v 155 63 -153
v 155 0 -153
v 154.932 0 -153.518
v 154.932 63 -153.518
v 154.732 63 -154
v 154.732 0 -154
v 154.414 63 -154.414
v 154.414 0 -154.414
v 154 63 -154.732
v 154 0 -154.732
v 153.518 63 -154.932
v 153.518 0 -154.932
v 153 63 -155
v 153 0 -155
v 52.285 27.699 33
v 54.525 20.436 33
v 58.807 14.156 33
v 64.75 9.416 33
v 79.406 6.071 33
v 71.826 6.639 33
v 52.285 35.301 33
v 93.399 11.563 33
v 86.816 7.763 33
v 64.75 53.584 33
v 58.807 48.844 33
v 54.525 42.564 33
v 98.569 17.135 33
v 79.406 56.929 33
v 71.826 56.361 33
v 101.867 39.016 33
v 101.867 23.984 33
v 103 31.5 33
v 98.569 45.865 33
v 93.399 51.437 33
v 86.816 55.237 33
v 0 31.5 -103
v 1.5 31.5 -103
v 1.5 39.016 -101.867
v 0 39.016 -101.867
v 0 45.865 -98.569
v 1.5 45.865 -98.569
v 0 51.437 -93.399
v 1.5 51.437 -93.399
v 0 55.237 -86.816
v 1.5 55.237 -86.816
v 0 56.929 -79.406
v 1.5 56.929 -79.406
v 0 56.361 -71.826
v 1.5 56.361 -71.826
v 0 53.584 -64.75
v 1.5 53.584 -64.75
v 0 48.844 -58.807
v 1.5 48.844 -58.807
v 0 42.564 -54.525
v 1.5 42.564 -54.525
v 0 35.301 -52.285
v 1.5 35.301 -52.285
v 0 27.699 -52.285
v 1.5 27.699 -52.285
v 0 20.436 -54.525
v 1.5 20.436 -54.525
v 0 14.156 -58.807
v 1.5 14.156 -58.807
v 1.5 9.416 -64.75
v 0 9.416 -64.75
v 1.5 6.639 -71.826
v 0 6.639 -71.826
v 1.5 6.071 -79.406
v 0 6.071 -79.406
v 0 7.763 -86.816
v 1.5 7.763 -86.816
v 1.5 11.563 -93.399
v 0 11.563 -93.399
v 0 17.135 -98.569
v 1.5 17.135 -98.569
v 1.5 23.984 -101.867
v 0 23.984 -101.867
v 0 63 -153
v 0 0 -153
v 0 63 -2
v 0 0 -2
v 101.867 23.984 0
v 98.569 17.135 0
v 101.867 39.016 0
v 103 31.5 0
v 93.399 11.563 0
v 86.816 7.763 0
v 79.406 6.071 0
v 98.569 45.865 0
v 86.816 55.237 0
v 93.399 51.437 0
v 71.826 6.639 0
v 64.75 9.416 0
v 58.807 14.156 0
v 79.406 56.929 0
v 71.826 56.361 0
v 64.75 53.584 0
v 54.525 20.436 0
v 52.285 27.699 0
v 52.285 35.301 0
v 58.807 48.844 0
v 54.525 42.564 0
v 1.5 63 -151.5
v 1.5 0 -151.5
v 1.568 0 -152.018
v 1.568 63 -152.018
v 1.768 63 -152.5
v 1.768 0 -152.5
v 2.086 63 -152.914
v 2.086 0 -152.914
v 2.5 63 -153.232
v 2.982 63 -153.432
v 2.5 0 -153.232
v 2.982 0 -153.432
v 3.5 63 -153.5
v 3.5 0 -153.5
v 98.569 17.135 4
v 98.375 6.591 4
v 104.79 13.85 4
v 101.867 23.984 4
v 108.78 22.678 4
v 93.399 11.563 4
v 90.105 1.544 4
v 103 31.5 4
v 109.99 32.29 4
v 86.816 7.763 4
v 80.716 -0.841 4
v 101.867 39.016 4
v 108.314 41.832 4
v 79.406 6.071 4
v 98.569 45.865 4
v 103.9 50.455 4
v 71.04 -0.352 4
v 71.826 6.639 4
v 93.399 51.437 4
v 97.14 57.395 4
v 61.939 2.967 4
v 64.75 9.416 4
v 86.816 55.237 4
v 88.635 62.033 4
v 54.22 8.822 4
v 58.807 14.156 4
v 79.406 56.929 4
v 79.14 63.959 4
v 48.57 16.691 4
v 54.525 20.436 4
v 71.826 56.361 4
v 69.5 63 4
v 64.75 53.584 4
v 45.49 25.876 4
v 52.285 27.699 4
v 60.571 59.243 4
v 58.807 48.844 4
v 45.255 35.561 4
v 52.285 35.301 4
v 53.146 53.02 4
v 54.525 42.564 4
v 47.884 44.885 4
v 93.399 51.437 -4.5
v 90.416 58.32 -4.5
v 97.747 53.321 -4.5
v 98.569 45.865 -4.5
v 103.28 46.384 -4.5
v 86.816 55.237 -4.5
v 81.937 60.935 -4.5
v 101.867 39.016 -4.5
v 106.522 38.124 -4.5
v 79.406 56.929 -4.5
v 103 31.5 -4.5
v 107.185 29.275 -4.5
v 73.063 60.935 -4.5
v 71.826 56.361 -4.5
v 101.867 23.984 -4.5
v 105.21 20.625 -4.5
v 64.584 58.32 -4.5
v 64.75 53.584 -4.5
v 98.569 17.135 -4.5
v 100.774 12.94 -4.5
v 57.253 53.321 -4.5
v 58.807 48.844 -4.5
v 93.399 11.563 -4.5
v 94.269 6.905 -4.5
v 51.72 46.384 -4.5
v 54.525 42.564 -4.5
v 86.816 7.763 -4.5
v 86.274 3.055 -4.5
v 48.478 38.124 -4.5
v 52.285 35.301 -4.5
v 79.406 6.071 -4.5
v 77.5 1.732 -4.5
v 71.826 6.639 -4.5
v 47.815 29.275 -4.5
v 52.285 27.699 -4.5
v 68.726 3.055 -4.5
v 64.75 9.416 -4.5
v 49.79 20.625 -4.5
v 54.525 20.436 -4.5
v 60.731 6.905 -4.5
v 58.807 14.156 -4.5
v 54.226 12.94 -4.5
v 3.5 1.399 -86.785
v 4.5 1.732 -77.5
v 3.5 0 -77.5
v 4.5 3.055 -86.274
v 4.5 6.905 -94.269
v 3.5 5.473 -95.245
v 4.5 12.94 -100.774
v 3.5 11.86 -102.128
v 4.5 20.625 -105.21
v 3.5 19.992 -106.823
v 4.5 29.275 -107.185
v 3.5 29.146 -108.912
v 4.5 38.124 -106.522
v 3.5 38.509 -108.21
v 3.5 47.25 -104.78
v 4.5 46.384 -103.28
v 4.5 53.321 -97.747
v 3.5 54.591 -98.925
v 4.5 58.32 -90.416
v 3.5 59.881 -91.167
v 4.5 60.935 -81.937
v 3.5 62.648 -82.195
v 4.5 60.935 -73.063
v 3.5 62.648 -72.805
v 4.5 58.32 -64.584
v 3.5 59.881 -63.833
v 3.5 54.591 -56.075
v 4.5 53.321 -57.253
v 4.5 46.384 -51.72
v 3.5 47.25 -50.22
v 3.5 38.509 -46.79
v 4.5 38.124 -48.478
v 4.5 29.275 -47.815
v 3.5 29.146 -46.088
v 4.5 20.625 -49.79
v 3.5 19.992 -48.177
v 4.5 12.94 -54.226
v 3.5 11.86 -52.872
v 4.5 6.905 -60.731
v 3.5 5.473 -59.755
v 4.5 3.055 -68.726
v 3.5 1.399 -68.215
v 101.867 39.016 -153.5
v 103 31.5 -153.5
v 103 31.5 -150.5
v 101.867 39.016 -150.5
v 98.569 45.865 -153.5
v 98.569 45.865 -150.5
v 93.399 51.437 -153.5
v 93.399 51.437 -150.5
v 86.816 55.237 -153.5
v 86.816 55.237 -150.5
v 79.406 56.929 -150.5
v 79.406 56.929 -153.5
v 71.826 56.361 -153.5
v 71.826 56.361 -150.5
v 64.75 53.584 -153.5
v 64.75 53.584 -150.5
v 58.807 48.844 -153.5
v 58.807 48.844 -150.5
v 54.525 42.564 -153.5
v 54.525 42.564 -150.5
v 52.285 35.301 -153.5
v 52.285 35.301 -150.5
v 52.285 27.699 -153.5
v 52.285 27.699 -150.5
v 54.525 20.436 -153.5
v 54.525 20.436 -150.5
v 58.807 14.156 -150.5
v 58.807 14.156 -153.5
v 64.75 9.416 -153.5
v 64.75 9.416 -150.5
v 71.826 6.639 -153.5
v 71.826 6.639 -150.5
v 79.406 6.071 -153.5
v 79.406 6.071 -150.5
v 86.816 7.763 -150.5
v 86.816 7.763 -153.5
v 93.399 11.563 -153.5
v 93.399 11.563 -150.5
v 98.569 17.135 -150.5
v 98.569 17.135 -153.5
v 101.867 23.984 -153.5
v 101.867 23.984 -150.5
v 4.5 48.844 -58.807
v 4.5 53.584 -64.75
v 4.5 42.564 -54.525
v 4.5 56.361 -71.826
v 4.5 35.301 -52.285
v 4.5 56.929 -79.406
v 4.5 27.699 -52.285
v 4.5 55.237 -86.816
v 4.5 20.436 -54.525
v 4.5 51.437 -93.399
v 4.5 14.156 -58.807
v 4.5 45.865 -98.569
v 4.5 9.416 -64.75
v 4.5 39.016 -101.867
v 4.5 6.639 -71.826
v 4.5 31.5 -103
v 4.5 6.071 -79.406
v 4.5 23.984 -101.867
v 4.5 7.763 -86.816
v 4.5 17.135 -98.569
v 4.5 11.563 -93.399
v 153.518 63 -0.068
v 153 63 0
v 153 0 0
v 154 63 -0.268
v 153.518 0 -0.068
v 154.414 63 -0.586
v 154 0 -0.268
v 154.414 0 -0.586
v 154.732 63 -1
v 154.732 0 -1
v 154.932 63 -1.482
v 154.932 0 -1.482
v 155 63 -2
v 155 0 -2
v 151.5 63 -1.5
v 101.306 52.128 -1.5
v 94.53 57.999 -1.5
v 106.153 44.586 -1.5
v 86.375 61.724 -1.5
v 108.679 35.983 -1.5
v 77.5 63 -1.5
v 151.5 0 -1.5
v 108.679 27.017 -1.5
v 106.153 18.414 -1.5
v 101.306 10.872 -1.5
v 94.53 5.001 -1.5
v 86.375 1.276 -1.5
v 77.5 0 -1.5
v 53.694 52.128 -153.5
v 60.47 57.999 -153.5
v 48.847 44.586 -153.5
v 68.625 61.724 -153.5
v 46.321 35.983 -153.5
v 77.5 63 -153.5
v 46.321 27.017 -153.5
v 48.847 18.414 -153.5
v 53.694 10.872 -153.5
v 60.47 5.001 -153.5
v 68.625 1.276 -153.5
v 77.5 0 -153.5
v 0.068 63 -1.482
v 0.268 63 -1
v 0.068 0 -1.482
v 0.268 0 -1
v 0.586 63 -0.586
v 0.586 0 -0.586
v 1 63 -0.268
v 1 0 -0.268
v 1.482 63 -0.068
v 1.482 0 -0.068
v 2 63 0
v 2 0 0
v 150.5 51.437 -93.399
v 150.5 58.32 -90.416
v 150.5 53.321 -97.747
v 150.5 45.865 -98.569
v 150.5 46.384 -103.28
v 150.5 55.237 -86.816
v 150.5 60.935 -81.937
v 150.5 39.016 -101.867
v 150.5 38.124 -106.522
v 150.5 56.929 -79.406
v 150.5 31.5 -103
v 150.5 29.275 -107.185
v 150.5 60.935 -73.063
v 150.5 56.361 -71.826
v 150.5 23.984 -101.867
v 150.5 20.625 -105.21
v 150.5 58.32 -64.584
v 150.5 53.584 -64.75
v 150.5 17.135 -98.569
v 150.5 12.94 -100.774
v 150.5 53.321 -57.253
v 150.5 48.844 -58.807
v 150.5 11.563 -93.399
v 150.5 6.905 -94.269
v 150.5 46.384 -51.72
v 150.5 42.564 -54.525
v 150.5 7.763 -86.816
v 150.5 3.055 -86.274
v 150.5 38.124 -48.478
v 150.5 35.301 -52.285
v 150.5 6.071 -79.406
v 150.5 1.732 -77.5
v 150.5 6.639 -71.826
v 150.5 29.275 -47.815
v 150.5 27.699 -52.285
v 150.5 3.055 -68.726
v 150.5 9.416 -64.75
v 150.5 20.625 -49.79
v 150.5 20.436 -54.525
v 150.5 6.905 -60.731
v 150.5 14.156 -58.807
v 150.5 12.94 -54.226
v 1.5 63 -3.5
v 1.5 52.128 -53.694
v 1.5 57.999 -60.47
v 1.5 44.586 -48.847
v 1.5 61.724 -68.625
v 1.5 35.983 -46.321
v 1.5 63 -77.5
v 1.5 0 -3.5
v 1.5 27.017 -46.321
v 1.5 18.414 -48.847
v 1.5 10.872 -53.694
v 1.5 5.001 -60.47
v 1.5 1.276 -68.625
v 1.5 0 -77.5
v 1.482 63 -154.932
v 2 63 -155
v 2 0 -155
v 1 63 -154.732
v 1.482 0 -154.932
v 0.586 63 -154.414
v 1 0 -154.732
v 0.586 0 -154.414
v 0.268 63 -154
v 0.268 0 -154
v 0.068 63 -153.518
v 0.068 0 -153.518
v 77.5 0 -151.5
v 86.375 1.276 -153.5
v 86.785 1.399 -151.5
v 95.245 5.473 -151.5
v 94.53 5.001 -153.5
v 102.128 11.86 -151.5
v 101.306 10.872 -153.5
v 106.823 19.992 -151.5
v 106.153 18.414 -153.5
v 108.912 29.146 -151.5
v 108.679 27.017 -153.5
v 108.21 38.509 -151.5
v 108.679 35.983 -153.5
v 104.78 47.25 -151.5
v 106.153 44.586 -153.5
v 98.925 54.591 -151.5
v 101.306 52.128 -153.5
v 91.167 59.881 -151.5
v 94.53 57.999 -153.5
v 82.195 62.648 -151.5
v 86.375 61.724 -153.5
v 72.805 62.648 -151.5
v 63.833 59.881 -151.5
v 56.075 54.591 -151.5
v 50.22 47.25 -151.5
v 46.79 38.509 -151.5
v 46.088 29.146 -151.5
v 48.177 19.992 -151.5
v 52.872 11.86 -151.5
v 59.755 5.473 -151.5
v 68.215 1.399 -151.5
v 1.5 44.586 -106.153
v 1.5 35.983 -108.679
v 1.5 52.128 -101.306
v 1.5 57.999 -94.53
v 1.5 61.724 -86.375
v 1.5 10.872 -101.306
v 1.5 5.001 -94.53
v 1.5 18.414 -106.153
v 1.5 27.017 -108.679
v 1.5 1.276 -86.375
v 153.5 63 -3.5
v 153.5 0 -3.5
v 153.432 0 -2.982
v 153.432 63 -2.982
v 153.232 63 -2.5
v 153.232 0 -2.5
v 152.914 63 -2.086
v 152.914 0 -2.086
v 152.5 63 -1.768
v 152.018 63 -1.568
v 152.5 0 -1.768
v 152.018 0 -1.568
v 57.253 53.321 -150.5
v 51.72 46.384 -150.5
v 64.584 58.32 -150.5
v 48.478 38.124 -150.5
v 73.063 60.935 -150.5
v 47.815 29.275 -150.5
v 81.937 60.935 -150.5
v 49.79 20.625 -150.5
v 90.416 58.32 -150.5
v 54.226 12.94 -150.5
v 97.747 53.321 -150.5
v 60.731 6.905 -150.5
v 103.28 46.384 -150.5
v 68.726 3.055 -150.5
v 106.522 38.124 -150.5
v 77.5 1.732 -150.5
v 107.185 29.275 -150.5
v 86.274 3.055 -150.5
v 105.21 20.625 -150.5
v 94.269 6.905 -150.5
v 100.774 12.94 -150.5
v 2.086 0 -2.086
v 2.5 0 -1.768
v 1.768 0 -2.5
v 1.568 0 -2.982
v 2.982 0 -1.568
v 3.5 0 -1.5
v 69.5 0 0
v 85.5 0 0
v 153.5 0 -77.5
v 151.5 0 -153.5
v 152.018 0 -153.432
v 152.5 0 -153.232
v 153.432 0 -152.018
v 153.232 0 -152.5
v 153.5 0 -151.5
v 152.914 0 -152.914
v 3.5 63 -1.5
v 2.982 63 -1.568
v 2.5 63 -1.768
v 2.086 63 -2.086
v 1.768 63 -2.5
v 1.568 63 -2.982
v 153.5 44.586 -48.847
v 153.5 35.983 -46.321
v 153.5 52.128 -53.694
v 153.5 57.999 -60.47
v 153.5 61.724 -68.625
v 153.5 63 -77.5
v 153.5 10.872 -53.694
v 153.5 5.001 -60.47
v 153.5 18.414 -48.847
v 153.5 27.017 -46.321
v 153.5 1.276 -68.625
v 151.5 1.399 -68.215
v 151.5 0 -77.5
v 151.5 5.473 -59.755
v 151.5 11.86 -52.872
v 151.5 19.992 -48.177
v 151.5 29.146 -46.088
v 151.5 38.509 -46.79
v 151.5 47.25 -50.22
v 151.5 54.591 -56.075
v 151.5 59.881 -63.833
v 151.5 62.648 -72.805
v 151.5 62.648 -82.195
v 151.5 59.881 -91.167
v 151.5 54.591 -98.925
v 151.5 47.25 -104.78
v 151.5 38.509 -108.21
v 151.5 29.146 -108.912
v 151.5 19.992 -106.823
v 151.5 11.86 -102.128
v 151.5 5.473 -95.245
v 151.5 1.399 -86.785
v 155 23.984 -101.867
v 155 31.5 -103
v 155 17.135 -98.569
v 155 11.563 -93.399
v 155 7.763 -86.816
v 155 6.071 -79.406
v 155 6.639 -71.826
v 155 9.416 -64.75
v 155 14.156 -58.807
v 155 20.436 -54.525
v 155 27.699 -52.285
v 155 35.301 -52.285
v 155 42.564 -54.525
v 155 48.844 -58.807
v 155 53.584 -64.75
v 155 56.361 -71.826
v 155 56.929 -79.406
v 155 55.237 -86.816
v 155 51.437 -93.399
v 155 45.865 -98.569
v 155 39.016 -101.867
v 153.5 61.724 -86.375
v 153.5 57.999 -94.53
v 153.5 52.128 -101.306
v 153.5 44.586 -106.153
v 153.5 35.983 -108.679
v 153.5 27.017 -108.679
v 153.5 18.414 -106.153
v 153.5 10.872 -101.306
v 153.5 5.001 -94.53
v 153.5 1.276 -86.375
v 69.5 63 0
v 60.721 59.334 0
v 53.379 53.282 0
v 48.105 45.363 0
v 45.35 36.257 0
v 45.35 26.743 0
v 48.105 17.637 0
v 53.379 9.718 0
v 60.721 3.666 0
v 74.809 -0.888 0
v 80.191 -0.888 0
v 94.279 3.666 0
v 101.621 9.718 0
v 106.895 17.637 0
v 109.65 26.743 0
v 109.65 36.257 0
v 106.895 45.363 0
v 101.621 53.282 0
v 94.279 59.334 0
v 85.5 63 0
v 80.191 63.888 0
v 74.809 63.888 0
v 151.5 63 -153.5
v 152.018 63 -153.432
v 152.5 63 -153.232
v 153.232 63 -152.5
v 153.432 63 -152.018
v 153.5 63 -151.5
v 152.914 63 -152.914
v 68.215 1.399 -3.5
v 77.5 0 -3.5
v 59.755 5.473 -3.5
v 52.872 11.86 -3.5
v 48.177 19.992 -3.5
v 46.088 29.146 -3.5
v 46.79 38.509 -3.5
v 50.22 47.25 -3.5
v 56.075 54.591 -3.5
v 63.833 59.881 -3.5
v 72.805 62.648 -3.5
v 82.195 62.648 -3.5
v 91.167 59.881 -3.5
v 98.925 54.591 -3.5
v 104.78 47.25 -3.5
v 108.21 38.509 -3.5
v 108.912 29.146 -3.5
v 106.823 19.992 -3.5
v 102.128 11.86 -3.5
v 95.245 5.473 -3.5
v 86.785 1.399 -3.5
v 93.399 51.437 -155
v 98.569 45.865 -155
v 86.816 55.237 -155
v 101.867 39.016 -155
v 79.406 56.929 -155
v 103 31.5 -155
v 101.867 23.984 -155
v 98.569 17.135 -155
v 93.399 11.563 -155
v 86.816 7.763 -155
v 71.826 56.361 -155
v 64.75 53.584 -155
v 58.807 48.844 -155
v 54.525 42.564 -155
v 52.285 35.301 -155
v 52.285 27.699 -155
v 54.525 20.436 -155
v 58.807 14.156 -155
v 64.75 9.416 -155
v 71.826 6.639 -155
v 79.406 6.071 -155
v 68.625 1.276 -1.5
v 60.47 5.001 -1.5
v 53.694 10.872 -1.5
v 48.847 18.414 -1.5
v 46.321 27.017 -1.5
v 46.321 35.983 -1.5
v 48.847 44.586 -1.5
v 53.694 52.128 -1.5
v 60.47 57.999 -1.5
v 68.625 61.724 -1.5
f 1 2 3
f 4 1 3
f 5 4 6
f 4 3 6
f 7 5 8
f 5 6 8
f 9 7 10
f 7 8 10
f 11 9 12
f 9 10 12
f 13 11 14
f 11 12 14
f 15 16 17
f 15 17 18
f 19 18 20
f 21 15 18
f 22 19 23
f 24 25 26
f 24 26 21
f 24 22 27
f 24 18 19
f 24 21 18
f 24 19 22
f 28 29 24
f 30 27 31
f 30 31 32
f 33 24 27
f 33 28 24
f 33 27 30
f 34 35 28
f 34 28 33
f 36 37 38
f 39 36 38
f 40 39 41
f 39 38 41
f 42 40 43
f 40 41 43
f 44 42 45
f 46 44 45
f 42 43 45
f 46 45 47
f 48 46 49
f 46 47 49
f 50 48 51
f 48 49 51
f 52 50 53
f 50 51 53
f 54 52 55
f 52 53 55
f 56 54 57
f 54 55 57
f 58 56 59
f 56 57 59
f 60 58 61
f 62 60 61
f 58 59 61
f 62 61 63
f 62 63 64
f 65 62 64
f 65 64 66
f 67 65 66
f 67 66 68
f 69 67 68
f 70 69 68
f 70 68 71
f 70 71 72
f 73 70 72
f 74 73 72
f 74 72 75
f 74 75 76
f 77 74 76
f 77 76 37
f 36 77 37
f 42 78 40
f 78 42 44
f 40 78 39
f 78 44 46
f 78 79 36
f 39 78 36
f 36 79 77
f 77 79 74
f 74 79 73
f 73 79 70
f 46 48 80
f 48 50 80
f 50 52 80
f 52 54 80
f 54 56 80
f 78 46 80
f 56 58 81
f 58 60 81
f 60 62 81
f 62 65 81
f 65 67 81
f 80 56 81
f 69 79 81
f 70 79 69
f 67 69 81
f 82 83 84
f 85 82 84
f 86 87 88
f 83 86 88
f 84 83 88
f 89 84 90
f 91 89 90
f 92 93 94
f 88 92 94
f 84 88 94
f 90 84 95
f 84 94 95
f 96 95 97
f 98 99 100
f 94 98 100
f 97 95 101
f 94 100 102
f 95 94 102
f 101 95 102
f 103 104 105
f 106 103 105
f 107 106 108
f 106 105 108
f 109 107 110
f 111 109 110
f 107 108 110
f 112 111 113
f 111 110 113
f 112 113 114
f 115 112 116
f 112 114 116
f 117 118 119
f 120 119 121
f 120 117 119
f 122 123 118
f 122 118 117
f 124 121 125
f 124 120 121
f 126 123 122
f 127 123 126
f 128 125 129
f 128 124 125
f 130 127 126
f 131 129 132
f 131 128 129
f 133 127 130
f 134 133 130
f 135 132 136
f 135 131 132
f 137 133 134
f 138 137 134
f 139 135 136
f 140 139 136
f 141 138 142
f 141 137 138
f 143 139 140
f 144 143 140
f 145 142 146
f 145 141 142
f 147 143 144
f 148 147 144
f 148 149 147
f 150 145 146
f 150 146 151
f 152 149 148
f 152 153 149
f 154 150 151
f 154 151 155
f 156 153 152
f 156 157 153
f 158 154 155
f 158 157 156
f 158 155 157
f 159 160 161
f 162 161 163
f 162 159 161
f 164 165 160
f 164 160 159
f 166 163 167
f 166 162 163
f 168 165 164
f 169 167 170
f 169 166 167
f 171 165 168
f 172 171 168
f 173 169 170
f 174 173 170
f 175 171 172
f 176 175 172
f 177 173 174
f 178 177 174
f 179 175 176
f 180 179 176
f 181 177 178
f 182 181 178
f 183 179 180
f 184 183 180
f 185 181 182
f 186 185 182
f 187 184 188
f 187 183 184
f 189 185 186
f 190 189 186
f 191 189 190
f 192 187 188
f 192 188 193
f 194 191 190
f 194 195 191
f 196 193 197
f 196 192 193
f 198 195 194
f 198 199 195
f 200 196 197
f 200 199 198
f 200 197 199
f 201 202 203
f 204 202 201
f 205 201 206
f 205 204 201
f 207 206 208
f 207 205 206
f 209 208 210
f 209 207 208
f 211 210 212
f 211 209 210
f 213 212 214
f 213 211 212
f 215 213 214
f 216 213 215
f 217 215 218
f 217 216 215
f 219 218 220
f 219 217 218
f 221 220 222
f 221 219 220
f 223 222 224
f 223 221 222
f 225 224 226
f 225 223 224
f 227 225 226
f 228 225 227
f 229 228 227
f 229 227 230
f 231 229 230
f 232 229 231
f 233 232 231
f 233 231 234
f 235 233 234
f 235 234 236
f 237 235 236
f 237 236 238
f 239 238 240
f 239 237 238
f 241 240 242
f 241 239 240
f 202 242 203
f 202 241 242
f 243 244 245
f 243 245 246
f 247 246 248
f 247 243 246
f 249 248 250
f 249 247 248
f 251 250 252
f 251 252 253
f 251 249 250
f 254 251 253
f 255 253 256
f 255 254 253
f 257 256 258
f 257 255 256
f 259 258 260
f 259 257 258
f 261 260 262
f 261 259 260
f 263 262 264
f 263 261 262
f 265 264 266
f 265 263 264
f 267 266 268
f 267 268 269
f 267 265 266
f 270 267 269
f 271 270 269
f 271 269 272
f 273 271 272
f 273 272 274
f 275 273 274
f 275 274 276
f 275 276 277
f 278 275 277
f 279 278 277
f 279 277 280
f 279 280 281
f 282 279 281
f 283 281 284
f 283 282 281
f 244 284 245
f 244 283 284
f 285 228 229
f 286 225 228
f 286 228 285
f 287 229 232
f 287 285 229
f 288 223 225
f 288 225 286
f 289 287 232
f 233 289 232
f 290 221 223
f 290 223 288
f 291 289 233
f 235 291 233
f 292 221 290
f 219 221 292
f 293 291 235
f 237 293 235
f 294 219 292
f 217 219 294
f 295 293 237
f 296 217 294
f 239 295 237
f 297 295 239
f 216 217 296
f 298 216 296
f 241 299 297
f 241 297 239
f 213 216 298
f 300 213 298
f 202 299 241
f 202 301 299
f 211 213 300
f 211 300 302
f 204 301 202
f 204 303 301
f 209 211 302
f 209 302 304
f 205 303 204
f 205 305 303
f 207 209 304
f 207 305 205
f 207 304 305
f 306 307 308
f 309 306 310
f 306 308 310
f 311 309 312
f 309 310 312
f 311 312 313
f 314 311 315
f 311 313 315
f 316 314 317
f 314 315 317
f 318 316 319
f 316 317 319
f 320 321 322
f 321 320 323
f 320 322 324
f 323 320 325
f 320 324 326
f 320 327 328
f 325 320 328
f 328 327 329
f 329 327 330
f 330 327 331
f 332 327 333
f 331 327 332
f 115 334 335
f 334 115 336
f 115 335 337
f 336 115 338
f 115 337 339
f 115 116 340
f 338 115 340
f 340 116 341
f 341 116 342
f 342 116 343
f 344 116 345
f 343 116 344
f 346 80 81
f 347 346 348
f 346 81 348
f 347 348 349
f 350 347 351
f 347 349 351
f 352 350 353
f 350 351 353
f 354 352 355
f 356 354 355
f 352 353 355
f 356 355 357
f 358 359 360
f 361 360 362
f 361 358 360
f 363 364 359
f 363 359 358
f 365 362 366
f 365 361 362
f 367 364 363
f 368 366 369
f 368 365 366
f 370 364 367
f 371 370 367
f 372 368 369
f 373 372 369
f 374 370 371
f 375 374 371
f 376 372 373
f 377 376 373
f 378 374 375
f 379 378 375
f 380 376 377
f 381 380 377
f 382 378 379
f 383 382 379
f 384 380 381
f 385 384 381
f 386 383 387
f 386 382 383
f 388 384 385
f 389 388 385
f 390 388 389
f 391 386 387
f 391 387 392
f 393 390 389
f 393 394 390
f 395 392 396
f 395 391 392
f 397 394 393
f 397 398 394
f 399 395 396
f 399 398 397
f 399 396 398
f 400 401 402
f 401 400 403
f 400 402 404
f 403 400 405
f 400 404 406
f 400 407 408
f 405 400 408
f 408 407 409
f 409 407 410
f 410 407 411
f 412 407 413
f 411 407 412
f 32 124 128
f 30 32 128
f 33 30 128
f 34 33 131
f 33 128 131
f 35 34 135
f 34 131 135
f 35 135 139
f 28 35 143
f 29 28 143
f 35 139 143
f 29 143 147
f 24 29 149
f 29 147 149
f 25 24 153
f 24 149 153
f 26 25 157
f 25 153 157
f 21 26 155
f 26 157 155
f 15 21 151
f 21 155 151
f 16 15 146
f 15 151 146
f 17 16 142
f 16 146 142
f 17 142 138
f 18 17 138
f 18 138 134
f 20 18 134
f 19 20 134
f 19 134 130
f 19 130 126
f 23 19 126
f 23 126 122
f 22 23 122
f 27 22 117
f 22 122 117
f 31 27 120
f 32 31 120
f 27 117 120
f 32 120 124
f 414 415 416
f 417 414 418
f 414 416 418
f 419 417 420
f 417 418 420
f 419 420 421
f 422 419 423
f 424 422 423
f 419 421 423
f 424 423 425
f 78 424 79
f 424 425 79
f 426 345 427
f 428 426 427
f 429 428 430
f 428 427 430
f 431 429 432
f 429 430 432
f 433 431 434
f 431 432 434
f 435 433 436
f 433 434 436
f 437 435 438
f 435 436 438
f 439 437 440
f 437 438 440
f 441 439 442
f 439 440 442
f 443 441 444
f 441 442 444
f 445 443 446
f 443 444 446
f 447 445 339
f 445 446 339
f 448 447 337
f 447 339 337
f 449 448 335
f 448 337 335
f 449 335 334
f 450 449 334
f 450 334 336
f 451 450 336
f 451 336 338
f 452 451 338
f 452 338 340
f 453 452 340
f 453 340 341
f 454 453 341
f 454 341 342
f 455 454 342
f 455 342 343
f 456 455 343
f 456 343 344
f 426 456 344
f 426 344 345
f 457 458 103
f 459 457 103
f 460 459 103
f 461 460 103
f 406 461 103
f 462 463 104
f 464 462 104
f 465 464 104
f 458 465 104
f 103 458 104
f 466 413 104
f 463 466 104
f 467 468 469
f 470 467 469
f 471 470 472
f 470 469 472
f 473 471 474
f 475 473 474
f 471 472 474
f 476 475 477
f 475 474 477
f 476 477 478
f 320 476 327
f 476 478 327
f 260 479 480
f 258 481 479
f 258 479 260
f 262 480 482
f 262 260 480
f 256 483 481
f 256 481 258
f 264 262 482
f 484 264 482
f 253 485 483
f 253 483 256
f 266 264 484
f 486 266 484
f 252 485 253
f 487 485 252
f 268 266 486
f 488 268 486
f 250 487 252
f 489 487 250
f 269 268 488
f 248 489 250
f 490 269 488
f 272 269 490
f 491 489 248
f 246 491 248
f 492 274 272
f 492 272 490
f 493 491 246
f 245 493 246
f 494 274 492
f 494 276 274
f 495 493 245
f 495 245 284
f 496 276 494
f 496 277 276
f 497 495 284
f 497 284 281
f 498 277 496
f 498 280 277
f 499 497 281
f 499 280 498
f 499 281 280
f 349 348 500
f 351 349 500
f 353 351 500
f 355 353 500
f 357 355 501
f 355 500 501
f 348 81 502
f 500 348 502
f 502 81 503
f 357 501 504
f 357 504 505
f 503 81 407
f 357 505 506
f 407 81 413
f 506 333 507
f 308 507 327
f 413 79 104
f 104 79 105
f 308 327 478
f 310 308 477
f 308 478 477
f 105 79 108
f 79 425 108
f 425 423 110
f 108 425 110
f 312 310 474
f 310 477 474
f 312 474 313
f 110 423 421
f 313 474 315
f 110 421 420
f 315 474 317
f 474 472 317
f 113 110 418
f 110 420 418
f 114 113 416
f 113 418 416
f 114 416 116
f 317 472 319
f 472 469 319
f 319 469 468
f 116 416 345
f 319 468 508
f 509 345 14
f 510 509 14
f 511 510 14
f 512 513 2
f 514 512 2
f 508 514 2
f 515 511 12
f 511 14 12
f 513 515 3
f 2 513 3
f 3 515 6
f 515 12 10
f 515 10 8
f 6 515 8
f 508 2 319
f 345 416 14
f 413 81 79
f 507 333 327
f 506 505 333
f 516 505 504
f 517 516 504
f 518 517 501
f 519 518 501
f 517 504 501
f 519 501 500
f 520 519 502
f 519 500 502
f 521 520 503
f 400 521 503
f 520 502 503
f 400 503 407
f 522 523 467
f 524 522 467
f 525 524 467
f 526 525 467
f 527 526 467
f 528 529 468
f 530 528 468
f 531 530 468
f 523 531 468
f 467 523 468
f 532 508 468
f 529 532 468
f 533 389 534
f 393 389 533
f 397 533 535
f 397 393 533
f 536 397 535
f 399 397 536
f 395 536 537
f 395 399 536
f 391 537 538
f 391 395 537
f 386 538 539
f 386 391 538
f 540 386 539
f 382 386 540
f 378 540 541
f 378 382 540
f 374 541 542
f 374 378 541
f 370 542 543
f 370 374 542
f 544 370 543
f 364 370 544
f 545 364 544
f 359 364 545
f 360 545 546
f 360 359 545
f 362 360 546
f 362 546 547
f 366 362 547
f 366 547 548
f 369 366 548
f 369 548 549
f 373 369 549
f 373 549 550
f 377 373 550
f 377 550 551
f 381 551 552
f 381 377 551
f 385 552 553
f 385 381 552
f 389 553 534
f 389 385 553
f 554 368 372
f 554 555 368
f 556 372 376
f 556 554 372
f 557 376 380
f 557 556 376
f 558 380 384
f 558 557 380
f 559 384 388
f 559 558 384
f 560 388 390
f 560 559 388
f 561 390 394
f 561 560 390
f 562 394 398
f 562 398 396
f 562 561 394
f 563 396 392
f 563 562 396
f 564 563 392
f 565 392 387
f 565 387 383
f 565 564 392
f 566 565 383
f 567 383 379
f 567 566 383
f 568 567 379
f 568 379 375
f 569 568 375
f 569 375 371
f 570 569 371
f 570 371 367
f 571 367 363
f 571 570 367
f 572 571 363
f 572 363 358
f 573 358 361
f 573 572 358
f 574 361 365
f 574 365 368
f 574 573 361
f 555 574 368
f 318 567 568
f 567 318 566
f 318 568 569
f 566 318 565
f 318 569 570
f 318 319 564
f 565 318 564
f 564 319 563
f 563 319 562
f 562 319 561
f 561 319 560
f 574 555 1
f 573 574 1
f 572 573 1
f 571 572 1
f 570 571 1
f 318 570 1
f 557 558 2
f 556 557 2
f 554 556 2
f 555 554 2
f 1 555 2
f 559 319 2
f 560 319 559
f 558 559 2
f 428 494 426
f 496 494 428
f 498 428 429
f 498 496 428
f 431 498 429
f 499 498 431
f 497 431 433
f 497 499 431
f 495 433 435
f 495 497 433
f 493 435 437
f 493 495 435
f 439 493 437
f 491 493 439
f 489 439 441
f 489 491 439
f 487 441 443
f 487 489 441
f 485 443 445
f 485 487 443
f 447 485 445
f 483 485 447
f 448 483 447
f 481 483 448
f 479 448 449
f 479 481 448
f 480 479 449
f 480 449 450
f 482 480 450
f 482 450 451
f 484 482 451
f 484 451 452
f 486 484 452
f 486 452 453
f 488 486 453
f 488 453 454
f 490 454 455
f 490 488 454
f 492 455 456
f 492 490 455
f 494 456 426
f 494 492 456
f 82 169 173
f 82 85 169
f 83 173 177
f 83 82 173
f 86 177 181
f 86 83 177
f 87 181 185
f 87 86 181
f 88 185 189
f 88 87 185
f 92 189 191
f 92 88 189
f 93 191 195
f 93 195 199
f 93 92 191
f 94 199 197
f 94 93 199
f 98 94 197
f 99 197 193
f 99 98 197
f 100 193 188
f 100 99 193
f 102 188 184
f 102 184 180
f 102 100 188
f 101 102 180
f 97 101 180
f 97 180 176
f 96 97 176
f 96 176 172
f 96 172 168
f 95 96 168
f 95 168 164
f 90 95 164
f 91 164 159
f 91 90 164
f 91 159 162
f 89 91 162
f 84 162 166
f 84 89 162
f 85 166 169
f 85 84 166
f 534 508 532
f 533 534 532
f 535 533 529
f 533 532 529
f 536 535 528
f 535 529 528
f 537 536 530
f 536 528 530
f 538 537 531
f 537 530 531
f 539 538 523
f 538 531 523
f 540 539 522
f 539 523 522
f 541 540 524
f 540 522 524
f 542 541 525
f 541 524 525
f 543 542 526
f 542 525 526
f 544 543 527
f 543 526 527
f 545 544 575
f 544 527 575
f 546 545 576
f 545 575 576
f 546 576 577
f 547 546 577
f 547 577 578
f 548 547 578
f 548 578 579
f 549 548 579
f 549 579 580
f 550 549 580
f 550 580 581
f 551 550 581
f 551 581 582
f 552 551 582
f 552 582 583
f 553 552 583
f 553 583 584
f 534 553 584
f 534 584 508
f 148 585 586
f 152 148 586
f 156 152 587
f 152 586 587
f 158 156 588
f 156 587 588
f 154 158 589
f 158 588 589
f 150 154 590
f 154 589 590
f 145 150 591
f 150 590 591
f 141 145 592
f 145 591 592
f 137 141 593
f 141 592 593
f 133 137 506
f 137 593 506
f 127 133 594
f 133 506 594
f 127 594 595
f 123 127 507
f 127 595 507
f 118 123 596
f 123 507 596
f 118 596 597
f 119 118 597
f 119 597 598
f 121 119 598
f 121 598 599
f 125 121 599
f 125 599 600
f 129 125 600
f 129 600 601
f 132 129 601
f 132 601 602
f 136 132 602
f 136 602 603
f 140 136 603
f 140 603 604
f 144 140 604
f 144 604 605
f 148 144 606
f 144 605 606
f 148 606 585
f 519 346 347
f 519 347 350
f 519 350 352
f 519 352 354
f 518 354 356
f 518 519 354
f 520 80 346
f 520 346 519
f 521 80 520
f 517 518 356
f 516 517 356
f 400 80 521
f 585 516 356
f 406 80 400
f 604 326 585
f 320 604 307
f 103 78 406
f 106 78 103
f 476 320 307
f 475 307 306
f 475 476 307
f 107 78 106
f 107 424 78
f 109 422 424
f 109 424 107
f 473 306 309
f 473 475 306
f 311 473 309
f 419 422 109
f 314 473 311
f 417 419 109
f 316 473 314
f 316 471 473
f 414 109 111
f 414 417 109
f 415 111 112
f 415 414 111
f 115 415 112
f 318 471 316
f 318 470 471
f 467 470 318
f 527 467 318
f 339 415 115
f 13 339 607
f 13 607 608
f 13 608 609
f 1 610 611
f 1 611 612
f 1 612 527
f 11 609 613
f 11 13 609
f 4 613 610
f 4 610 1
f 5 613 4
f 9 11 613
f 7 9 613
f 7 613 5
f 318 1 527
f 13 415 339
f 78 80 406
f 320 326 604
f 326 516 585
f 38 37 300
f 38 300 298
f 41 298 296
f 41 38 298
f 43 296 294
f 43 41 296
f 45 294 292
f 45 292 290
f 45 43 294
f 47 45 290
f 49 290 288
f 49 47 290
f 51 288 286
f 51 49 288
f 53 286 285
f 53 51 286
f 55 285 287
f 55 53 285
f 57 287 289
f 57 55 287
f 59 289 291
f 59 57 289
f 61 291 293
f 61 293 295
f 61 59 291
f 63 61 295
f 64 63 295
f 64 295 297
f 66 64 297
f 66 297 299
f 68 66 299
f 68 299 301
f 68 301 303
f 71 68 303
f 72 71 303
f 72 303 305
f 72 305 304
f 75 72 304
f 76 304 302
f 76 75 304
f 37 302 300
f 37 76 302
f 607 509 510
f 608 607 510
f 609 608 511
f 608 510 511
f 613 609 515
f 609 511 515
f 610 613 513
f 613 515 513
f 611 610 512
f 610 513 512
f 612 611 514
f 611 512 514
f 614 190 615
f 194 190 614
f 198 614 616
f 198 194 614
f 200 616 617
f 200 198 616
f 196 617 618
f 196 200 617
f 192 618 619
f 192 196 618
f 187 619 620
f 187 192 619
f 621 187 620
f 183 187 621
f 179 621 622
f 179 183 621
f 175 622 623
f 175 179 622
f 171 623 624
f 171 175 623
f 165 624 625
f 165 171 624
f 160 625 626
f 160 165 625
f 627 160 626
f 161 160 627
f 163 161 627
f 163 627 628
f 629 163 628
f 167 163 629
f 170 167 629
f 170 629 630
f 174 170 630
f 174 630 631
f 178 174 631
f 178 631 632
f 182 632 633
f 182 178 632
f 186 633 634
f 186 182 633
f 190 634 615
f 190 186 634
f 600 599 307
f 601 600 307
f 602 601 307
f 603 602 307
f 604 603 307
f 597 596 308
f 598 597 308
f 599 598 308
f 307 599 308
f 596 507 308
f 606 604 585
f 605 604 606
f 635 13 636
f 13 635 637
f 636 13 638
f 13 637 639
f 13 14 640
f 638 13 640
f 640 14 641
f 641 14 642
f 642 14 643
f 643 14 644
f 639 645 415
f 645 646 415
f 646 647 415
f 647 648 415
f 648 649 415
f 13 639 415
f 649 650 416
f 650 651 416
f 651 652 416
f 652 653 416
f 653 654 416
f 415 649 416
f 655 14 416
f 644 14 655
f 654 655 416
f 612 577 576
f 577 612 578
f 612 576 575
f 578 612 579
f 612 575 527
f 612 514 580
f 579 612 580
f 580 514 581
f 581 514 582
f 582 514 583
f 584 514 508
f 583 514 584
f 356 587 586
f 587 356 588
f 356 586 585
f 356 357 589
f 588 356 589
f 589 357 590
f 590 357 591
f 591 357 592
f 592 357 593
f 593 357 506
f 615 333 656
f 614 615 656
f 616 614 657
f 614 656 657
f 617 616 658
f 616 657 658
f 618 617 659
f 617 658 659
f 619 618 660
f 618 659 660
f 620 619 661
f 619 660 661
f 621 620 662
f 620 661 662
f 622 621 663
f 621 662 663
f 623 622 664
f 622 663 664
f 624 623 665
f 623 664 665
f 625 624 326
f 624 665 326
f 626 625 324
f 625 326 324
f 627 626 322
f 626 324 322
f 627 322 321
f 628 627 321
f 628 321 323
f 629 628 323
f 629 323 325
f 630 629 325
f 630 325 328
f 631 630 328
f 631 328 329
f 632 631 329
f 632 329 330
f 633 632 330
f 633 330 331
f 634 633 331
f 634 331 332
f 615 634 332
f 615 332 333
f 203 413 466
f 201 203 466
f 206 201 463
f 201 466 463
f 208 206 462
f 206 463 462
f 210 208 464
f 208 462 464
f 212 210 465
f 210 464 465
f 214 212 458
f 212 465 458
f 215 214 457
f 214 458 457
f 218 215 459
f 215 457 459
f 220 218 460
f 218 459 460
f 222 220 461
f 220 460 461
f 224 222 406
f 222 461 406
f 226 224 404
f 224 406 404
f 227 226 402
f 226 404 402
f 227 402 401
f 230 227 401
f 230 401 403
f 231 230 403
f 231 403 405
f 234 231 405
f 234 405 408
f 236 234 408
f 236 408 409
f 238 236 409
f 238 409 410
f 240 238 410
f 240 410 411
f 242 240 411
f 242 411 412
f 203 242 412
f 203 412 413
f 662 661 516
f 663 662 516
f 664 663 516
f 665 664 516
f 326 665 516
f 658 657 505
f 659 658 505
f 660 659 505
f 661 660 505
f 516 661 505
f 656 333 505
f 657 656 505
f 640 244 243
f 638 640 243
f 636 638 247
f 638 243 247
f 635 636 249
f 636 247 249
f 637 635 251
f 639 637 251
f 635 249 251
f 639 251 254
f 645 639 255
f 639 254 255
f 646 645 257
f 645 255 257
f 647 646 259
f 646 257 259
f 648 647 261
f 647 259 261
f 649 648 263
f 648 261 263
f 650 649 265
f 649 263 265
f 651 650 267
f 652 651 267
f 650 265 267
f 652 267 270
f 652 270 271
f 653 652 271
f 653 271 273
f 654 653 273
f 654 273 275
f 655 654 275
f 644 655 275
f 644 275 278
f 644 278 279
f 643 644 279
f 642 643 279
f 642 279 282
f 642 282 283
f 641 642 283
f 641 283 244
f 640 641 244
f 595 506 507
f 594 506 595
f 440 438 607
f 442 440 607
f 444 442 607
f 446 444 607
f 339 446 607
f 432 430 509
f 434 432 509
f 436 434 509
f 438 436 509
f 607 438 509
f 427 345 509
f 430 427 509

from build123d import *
from OCP.BRepFilletAPI import BRepFilletAPI_MakeChamfer

# Parameters (mm, degrees)
EXTRUDE_1_DEPTH     = 63
CUT_EXTRUDE_1_REACH = 230.077
SKETCH_2_R          = 25.5
CUT_EXTRUDE_2_REACH = 230.077
SKETCH_3_R          = 25.5
SKETCH_4_R          = 31.5
SKETCH_4_R_2        = 25.5
EXTRUDE_1_2_DEPTH   = 3
CHAMFER_1_SIZE      = 1
CHAMFER_1_SIZE2     = 1.732050808
SKETCH_5_R          = 31.5
SKETCH_5_R_2        = 25.5
EXTRUDE_4_DEPTH     = 3
CHAMFER_2_SIZE      = 1
CHAMFER_2_SIZE2     = 1.732050808
SKETCH_7_R          = 31.5
SKETCH_7_R_2        = 25.5
EXTRUDE_5_DEPTH     = 3
SKETCH_8_R          = 31.5
SKETCH_8_R_2        = 25.5
EXTRUDE_6_DEPTH     = 3
CHAMFER_3_SIZE      = 1
CHAMFER_3_SIZE2     = 1.732050808
SKETCH_9_R          = 32.5
EXTRUDE_7_DEPTH     = 4
SKETCH_10_R         = 25.5
EXTRUDE_8_DEPTH     = 29


with BuildPart() as part:
    # Эскиз1 → Extrude 1 (new body)
    with BuildSketch(Plane(origin=(0, 0, 0), x_dir=(1, 0, 0), z_dir=(0, 1, 0))):
        with BuildLine():
            Line((2, 0), (153, 0))
            ThreePointArc((153, 0), (154.414213562, 0.585786438), (155, 2))
            Line((155, 2), (155, 153))
            ThreePointArc((155, 153), (154.414213562, 154.414213562), (153, 155))
            Line((153, 155), (2, 155))
            ThreePointArc((2, 155), (0.585786438, 154.414213562), (0, 153))
            Line((0, 153), (0, 2))
            ThreePointArc((0, 2), (0.585786438, 0.585786438), (2, 0))
        make_face()
        with BuildLine():
            Line((3.5, 153.5), (151.5, 153.5))
            ThreePointArc((151.5, 153.5), (152.914213562, 152.914213562), (153.5, 151.5))
            Line((153.5, 151.5), (153.5, 3.5))
            ThreePointArc((153.5, 3.5), (152.914213562, 2.085786438), (151.5, 1.5))
            Line((151.5, 1.5), (3.5, 1.5))
            ThreePointArc((3.5, 1.5), (2.085786438, 2.085786438), (1.5, 3.5))
            Line((1.5, 3.5), (1.5, 151.5))
            ThreePointArc((1.5, 151.5), (2.085786438, 152.914213562), (3.5, 153.5))
        make_face(mode=Mode.SUBTRACT)
    extrude(amount=EXTRUDE_1_DEPTH)

    # Вырез-Вытянуть1: up to this face of the body (flat: up to its plane)
    cut_extrude_1_end = Plane(part.part.faces().sort_by_distance((77.5, 31.5, -155))[0])
    # Эскиз2 → Вырез-Вытянуть1 (cut, up to the picked face)
    with BuildSketch(Plane.XY, mode=Mode.PRIVATE) as cut_extrude_1_sk1:
        with Locations((77.5, 31.5)):
            Circle(SKETCH_2_R)
    cut_extrude_1_tool1 = split(extrude(cut_extrude_1_sk1.sketch, amount=-CUT_EXTRUDE_1_REACH, mode=Mode.PRIVATE), bisect_by=cut_extrude_1_end, keep=Keep.BOTH, mode=Mode.PRIVATE)
    add(cut_extrude_1_tool1.solids().sort_by(Axis((77.5, 31.5, 0), (0, 0, -1)))[0], mode=Mode.SUBTRACT)

    # Вырез-Вытянуть2: up to this face of the body (flat: up to its plane)
    cut_extrude_2_end = Plane(part.part.faces().sort_by_distance((0, 31.5, -77.5))[0])
    # Эскиз3 → Вырез-Вытянуть2 (cut, up to the picked face)
    with BuildSketch(Plane(origin=(155, 0, 0), x_dir=(0, 0, -1), z_dir=(1, 0, 0)), mode=Mode.PRIVATE) as cut_extrude_2_sk1:
        with Locations((77.5, 31.5)):
            Circle(SKETCH_3_R)
    cut_extrude_2_tool1 = split(extrude(cut_extrude_2_sk1.sketch, amount=-CUT_EXTRUDE_2_REACH, mode=Mode.PRIVATE), bisect_by=cut_extrude_2_end, keep=Keep.BOTH, mode=Mode.PRIVATE)
    add(cut_extrude_2_tool1.solids().sort_by(Axis((155, 31.5, -77.5), (-1, 0, 0)))[0], mode=Mode.SUBTRACT)

    # Эскиз4 → Extrude 1 2 (add)
    with BuildSketch(Plane(origin=(0, 0, -1.5), x_dir=(-1, 0, 0), z_dir=(0, 0, -1))):
        with Locations(Location((-77.5, 31.5, 0), (0, 0, 270))):
            Circle(SKETCH_4_R)
        with Locations(Location((-77.5, 31.5, 0), (0, 0, 180))):
            Circle(SKETCH_4_R_2, mode=Mode.SUBTRACT)
    extrude(amount=EXTRUDE_1_2_DEPTH)

    # Фаска1 шайба
    chamfer_1_edges = [part.edges().sort_by_distance(p)[0] for p in [
        (77.5, 63, -4.5),
    ]]
    chamfer_1_side = [part.faces().sort_by_distance(p)[0] for p in [
        (77.5, 63, -3),
    ]]
    chamfer(chamfer_1_edges, length=CHAMFER_1_SIZE, length2=CHAMFER_1_SIZE2, reference=chamfer_1_side[0])

    # Эскиз5 → Бобышка-Вытянуть4 (add)
    with BuildSketch(Plane(origin=(1.5, 0, 0), x_dir=(0, 0, -1), z_dir=(1, 0, 0))):
        with Locations(Location((77.5, 31.5, 0), (0, 0, 270))):
            Circle(SKETCH_5_R)
        with Locations((77.5, 31.5)):
            Circle(SKETCH_5_R_2, mode=Mode.SUBTRACT)
    extrude(amount=EXTRUDE_4_DEPTH)

    # Фаска2
    chamfer_2_edges = [part.edges().sort_by_distance(p)[0] for p in [
        (4.5, 63, -77.5),
    ]]
    chamfer_2_side = [part.faces().sort_by_distance(p)[0] for p in [
        (3, 63, -77.5),
    ]]
    chamfer(chamfer_2_edges, length=CHAMFER_2_SIZE, length2=CHAMFER_2_SIZE2, reference=chamfer_2_side[0])

    # Эскиз7 → Бобышка-Вытянуть5 (add)
    with BuildSketch(Plane.XY.offset(-153.5)):
        with Locations(Location((77.5, 31.5, 0), (0, 0, 270))):
            Circle(SKETCH_7_R)
        with Locations((77.5, 31.5)):
            Circle(SKETCH_7_R_2, mode=Mode.SUBTRACT)
    extrude(amount=EXTRUDE_5_DEPTH)

    # Эскиз8 → Бобышка-Вытянуть6 (add)
    with BuildSketch(Plane.ZY.offset(-153.5)):
        with Locations(Location((-77.5, 31.5, 0), (0, 0, 270))):
            Circle(SKETCH_8_R)
        with Locations(Location((-77.5, 31.5, 0), (0, 0, 180))):
            Circle(SKETCH_8_R_2, mode=Mode.SUBTRACT)
    extrude(amount=EXTRUDE_6_DEPTH)

    # Фаска3: one chamfer whose edges measure the first distance from different faces: ONE call of the kernel's chamfer builder (chamfer() names one face for all edges)
    chamfer_3_edges_1 = [part.edges().sort_by_distance(p)[0] for p in [
        (150.5, 63, -77.5),
    ]]
    chamfer_3_side_1 = [part.faces().sort_by_distance(p)[0] for p in [
        (152, 63, -77.5),
    ]]
    chamfer_3_edges_2 = [part.edges().sort_by_distance(p)[0] for p in [
        (77.5, 63, -150.5),
    ]]
    chamfer_3_side_2 = [part.faces().sort_by_distance(p)[0] for p in [
        (77.5, 63, -152),
    ]]
    chamfer_3 = BRepFilletAPI_MakeChamfer(part.part.solid().wrapped)
    for e in chamfer_3_edges_1:
        chamfer_3.Add(CHAMFER_3_SIZE, CHAMFER_3_SIZE2, e.wrapped, chamfer_3_side_1[0].wrapped)  # the first distance lies on this face
    for e in chamfer_3_edges_2:
        chamfer_3.Add(CHAMFER_3_SIZE, CHAMFER_3_SIZE2, e.wrapped, chamfer_3_side_2[0].wrapped)  # the first distance lies on this face
    add(Compound.cast(chamfer_3.Shape()), mode=Mode.REPLACE)

    # Эскиз9 → Бобышка-Вытянуть7 (add)
    with BuildSketch(Plane.XY):
        with Locations(Location((77.5, 31.5, 0), (0, 0, 104.250032698))):
            Circle(SKETCH_9_R)
    extrude(amount=EXTRUDE_7_DEPTH)

    # Эскиз10 → Бобышка-Вытянуть8 (add)
    with BuildSketch(Plane.XY.offset(4)):
        with Locations((77.5, 31.5)):
            Circle(SKETCH_10_R)
    extrude(amount=EXTRUDE_8_DEPTH)


solid = part.part
